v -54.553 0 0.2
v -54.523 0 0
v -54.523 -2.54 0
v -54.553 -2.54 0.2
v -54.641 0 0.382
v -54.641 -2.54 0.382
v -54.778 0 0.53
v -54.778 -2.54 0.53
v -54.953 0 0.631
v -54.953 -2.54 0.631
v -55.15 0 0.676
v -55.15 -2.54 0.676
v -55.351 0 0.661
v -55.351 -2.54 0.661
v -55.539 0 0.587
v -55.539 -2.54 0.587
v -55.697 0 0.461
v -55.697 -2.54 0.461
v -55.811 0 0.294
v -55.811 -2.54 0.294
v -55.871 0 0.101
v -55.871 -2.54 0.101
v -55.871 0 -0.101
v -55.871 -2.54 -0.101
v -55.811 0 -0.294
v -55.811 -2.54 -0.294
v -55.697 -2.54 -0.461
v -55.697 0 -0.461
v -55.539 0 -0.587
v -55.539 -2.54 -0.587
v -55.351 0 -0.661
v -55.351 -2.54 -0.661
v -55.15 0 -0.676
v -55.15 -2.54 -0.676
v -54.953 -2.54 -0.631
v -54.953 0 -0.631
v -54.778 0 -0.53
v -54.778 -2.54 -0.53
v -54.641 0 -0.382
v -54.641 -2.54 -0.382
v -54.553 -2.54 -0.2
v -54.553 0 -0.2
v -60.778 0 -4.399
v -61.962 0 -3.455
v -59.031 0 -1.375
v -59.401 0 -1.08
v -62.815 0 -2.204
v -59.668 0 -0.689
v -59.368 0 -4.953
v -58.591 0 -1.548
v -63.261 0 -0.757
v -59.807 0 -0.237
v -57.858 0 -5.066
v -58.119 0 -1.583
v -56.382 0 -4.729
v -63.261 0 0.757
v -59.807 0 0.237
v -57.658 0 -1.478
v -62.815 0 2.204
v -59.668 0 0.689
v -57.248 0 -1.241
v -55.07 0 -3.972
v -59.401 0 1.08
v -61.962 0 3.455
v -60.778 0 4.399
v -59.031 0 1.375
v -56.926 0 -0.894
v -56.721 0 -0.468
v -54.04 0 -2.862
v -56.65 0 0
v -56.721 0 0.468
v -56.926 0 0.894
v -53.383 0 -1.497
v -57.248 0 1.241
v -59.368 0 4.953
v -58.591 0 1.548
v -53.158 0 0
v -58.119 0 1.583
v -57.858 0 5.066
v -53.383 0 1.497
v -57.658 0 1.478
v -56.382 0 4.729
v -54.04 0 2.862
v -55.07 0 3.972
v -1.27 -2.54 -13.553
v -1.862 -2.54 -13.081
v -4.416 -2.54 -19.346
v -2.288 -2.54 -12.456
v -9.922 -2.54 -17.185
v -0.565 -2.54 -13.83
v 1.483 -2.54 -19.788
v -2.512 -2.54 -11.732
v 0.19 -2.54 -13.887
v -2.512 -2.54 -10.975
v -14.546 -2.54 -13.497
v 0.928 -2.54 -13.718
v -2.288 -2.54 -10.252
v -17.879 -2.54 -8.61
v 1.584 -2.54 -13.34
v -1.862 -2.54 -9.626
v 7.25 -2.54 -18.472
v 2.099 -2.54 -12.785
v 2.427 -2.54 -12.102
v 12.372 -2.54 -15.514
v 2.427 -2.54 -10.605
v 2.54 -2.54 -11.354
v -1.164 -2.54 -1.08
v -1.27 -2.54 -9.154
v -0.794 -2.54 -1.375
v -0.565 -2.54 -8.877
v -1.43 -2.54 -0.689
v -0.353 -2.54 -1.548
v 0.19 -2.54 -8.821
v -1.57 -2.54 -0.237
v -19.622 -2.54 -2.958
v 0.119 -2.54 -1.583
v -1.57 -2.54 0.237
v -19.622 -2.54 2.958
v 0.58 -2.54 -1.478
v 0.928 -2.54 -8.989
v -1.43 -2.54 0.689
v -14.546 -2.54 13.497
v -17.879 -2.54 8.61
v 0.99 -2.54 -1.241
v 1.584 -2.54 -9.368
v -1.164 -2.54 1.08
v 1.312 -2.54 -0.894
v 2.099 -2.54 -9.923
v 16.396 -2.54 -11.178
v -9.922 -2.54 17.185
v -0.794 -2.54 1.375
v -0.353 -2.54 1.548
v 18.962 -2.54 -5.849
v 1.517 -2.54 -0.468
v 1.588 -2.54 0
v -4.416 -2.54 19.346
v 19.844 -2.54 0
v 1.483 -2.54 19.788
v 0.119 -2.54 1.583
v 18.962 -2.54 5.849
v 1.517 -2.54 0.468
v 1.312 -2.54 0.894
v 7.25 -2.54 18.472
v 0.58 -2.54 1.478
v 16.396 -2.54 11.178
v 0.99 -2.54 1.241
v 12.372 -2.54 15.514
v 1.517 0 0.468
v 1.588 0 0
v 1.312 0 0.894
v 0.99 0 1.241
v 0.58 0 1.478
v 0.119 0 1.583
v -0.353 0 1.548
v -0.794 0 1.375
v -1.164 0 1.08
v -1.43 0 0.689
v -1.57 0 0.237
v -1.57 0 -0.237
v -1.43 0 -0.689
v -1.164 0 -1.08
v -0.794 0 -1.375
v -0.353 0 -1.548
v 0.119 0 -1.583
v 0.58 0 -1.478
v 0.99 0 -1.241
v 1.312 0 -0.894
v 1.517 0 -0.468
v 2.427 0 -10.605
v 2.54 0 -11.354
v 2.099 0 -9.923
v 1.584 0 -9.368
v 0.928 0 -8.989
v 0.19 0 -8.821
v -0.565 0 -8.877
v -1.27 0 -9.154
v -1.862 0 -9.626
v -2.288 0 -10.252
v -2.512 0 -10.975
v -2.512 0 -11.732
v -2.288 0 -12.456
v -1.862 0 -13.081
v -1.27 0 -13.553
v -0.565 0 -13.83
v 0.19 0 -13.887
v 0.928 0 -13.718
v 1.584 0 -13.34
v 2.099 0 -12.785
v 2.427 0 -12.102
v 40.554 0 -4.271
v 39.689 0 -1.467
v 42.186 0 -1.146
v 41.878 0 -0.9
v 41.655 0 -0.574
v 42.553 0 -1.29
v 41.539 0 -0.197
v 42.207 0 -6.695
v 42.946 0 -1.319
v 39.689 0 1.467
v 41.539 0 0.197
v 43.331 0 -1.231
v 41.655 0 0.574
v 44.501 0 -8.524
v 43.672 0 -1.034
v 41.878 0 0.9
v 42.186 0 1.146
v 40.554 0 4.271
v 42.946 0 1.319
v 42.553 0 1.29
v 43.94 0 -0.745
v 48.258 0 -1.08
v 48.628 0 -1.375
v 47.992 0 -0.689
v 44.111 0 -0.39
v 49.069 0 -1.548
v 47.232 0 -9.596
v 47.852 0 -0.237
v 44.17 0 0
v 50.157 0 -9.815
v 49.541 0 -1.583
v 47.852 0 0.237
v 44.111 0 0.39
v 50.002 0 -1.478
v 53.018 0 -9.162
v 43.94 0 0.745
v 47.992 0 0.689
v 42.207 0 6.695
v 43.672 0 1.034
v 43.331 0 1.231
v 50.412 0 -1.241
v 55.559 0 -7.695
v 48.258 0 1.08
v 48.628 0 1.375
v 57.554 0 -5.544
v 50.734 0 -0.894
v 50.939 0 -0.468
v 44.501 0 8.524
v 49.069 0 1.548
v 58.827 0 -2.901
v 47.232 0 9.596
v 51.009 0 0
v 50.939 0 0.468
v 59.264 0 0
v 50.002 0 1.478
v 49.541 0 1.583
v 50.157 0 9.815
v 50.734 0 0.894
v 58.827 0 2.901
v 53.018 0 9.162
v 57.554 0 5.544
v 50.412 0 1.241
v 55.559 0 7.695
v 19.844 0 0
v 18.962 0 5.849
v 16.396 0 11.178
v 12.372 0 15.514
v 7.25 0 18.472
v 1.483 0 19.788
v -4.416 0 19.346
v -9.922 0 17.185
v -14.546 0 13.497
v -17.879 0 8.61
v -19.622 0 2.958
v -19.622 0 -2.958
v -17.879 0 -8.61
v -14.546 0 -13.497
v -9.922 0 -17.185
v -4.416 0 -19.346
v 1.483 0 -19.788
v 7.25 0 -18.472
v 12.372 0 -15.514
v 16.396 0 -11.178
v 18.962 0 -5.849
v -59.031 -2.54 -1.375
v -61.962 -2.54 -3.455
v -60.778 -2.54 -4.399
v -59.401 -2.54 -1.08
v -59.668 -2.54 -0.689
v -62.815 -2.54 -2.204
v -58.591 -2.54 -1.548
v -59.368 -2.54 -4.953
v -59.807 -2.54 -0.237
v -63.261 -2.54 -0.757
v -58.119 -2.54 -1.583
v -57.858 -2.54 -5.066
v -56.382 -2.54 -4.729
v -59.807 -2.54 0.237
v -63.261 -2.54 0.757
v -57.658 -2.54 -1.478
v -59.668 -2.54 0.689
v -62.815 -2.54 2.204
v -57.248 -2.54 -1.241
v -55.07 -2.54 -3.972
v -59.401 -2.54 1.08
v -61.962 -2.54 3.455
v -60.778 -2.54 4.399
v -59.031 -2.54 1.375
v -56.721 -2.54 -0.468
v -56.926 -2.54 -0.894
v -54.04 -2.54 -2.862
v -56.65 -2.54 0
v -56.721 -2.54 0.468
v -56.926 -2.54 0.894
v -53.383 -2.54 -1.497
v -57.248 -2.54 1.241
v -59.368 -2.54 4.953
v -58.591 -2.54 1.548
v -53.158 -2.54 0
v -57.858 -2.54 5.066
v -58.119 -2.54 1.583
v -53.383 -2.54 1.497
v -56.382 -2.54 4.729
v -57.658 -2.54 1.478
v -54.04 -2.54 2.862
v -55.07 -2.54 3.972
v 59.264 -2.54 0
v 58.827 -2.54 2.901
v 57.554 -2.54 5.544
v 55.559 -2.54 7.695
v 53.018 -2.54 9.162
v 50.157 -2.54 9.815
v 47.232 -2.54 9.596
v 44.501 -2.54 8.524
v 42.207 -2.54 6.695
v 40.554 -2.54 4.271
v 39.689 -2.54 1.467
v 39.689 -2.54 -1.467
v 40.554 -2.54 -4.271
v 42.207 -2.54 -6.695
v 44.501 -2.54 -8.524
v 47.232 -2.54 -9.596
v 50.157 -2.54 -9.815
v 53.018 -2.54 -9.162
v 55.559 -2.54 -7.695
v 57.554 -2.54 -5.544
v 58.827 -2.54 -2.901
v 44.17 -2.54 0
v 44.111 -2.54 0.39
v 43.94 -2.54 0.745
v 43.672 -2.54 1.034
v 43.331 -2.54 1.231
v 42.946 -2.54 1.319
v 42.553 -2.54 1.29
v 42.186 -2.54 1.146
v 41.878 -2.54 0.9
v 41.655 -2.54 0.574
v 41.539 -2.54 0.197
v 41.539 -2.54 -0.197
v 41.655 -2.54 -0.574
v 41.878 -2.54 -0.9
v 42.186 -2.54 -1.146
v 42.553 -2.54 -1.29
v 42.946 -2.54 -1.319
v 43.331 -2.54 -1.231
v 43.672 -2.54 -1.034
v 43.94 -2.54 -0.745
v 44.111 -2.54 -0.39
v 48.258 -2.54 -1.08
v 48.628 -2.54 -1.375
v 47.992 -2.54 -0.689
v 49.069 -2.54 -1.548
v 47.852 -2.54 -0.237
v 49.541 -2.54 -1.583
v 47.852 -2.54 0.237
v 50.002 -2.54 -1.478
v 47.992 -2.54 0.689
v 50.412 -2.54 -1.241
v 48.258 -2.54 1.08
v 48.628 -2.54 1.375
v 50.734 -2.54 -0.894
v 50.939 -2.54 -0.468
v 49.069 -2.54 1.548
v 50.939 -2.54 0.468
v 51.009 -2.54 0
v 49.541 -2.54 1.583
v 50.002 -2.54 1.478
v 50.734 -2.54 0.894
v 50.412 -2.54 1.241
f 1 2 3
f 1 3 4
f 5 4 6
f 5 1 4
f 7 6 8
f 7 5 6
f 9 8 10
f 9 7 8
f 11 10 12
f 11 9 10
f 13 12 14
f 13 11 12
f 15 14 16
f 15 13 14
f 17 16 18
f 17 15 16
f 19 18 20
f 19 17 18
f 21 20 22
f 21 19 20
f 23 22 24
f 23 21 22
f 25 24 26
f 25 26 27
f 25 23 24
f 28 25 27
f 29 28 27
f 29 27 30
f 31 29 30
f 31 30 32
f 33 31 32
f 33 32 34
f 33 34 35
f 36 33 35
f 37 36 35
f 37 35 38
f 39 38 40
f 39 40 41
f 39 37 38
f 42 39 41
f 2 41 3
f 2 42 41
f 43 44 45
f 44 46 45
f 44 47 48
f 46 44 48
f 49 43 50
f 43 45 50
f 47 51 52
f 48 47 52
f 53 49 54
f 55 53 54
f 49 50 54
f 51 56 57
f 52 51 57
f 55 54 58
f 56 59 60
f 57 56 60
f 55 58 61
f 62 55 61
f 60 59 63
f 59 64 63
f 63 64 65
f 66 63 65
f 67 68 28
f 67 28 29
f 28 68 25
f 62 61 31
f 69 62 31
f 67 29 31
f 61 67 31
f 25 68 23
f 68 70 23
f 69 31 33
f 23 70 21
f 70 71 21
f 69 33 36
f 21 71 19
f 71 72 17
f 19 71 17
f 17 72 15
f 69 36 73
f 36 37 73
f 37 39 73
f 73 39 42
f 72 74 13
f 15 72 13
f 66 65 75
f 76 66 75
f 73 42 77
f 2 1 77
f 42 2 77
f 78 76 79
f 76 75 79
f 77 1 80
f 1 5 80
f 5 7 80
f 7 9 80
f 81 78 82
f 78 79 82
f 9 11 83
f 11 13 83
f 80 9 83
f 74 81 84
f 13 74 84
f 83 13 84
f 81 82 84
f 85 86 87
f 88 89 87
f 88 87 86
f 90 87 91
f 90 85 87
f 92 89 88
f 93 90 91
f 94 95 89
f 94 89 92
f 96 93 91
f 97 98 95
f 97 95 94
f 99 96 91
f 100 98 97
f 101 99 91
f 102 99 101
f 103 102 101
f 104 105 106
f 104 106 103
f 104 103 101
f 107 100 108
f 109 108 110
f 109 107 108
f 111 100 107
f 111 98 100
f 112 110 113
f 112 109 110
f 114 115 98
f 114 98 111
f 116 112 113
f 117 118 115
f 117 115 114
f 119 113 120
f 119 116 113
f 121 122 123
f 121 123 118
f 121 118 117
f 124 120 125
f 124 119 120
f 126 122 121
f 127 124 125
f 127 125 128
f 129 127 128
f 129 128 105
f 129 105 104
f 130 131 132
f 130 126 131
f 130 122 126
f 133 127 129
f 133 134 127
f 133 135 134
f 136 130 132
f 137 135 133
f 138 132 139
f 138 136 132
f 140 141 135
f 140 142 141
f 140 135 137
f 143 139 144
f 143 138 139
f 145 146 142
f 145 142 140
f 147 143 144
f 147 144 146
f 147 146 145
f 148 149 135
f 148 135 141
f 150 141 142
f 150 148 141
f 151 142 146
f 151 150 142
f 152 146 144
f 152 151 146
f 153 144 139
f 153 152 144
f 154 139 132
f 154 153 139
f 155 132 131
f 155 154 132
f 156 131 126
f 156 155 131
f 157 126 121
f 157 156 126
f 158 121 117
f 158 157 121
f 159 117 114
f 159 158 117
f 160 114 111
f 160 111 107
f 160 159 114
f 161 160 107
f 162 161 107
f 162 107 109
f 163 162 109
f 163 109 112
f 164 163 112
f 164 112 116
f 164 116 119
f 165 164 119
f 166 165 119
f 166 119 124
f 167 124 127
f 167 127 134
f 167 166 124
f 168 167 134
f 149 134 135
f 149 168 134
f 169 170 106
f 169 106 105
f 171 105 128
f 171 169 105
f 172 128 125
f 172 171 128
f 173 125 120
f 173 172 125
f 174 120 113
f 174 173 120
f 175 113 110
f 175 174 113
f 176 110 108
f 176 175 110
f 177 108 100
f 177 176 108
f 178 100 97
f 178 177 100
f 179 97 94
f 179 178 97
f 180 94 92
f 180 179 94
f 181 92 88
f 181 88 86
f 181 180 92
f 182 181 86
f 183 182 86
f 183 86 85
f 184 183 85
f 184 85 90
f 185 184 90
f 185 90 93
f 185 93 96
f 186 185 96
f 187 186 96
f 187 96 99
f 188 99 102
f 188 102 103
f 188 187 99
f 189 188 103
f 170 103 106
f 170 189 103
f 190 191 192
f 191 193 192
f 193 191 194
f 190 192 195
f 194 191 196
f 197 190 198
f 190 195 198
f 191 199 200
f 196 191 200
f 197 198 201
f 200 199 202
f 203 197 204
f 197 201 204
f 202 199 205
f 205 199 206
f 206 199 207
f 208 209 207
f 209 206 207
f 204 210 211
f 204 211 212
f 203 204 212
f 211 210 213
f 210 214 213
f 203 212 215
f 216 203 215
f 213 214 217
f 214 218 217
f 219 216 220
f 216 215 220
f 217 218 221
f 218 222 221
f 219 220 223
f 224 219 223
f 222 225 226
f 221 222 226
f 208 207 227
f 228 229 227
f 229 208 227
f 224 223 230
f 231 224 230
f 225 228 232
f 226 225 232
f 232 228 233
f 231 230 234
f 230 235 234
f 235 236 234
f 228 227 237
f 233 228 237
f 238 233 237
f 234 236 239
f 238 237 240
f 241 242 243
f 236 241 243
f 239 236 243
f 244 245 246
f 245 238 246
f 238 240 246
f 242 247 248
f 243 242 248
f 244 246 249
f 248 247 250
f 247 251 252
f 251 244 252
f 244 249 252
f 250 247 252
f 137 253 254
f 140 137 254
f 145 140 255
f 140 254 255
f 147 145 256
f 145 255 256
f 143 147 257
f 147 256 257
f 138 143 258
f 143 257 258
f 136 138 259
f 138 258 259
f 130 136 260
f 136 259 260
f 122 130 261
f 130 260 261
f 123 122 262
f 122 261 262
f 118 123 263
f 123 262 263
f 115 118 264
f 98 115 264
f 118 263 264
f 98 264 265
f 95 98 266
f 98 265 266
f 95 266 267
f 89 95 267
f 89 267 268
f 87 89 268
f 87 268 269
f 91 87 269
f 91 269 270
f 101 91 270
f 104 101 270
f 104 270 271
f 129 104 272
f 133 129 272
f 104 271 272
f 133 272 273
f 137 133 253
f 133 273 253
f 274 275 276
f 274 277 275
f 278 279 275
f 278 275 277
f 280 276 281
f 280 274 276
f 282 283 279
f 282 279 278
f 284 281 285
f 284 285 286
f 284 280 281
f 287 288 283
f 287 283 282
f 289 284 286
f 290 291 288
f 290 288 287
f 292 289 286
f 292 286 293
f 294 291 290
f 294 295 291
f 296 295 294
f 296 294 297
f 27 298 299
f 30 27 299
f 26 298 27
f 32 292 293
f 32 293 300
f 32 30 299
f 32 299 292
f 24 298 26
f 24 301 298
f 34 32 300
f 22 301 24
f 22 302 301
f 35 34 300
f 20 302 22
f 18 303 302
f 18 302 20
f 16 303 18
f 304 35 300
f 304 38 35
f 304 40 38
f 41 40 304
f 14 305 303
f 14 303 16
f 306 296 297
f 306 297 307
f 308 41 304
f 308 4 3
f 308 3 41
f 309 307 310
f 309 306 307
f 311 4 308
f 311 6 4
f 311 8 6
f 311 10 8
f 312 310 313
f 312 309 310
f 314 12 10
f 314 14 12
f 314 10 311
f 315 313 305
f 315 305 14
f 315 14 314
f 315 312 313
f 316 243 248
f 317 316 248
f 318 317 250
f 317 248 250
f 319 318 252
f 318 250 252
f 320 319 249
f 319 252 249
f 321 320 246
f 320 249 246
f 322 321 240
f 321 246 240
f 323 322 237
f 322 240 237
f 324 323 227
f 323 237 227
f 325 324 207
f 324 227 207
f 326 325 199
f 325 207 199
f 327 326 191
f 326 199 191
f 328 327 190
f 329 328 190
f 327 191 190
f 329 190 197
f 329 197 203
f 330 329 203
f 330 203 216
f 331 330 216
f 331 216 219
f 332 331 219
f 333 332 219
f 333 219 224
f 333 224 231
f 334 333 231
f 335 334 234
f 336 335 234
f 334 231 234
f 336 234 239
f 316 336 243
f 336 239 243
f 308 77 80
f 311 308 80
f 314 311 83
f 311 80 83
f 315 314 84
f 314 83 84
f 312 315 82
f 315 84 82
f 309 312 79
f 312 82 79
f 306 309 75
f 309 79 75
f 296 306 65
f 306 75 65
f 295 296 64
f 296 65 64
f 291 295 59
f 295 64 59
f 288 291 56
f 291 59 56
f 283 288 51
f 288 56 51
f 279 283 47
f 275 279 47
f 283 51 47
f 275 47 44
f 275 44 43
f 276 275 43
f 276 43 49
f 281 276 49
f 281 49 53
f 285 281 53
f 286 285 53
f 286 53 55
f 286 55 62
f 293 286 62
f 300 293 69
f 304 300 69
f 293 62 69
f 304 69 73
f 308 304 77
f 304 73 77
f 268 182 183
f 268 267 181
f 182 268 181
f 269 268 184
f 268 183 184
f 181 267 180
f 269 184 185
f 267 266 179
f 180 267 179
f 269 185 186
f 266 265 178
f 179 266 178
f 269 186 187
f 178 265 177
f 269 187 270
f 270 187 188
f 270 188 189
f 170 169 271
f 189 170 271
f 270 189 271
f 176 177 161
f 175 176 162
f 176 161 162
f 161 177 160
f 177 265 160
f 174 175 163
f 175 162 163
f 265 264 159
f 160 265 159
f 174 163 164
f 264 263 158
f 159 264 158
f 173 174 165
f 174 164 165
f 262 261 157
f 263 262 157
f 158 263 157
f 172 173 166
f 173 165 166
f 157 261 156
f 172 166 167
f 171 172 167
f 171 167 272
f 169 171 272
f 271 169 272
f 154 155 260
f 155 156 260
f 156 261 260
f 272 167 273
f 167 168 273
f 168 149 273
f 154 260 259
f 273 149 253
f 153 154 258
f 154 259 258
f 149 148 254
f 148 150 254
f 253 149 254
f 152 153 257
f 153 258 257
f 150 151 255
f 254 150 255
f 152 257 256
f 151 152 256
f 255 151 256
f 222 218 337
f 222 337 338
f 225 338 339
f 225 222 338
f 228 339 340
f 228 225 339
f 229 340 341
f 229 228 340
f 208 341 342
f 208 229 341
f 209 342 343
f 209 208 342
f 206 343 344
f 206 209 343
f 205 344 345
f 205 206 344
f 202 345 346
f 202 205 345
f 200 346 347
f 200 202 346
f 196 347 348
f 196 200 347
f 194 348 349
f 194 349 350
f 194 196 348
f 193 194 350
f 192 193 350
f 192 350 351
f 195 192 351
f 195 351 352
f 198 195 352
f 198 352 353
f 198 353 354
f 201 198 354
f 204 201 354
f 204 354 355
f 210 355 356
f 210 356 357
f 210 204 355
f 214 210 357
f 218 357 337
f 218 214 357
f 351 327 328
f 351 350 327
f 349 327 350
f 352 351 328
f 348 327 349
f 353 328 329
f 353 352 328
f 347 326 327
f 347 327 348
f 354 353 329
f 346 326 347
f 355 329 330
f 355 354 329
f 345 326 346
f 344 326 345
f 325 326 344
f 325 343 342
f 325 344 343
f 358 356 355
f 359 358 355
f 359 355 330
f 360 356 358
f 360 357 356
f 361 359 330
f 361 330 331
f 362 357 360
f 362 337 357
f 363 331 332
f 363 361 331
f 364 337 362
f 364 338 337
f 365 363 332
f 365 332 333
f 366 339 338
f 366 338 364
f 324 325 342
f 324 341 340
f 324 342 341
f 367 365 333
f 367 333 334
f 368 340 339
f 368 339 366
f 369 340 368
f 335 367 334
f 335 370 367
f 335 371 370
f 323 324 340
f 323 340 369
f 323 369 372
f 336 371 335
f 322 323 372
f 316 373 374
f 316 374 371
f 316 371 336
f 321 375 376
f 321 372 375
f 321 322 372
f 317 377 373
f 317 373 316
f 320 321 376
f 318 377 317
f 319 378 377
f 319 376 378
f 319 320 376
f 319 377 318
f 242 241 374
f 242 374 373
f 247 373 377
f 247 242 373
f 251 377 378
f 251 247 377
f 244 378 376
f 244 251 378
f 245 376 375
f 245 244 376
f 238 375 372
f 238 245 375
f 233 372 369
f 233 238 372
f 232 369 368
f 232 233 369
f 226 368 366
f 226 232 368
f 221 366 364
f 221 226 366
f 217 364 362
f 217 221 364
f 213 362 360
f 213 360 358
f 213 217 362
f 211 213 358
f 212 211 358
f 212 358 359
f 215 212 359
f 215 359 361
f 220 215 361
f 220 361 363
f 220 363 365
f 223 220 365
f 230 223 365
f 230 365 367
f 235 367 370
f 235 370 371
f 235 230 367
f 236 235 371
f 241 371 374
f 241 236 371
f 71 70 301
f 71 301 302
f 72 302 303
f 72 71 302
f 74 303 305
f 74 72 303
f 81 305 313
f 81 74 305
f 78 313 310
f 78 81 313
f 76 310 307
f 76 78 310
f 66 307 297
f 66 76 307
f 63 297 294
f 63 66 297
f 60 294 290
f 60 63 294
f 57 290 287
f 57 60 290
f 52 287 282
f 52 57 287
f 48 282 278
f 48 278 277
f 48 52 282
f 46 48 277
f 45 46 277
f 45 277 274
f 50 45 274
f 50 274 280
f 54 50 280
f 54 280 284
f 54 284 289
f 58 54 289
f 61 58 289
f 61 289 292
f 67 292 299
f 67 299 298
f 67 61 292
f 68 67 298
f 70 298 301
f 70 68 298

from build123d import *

# Parameters (mm, degrees)
F0_R     = 5.08
F0_R_2   = 1.5875
F0_R_3   = 0.677591
F0_R_4   = 9.8425
F0_R_5   = 1.322799
F0_R_6   = 19.84375
F0_R_7   = 2.54
F1_DEPTH = 2.54


with BuildPart() as f1:
    # F0 (on Front) → F1 (new body)
    with BuildSketch(Plane.XZ):
        with Locations((-58.237664, 0)):
            Circle(F0_R)
        with Locations((-58.237664, 0)):
            Circle(F0_R_2, mode=Mode.SUBTRACT)
        with Locations((-55.200603, 0)):
            Circle(F0_R_3, mode=Mode.SUBTRACT)
        with Locations((49.421869, 0)):
            Circle(F0_R_4)
        with Locations((42.847272, 0)):
            Circle(F0_R_5, mode=Mode.SUBTRACT)
        with Locations((49.421869, 0)):
            Circle(F0_R_2, mode=Mode.SUBTRACT)
        Circle(F0_R_6)
        with Locations((0, -11.353673)):
            Circle(F0_R_7, mode=Mode.SUBTRACT)
        Circle(F0_R_2, mode=Mode.SUBTRACT)
    extrude(amount=F1_DEPTH)


solid = f1.part
